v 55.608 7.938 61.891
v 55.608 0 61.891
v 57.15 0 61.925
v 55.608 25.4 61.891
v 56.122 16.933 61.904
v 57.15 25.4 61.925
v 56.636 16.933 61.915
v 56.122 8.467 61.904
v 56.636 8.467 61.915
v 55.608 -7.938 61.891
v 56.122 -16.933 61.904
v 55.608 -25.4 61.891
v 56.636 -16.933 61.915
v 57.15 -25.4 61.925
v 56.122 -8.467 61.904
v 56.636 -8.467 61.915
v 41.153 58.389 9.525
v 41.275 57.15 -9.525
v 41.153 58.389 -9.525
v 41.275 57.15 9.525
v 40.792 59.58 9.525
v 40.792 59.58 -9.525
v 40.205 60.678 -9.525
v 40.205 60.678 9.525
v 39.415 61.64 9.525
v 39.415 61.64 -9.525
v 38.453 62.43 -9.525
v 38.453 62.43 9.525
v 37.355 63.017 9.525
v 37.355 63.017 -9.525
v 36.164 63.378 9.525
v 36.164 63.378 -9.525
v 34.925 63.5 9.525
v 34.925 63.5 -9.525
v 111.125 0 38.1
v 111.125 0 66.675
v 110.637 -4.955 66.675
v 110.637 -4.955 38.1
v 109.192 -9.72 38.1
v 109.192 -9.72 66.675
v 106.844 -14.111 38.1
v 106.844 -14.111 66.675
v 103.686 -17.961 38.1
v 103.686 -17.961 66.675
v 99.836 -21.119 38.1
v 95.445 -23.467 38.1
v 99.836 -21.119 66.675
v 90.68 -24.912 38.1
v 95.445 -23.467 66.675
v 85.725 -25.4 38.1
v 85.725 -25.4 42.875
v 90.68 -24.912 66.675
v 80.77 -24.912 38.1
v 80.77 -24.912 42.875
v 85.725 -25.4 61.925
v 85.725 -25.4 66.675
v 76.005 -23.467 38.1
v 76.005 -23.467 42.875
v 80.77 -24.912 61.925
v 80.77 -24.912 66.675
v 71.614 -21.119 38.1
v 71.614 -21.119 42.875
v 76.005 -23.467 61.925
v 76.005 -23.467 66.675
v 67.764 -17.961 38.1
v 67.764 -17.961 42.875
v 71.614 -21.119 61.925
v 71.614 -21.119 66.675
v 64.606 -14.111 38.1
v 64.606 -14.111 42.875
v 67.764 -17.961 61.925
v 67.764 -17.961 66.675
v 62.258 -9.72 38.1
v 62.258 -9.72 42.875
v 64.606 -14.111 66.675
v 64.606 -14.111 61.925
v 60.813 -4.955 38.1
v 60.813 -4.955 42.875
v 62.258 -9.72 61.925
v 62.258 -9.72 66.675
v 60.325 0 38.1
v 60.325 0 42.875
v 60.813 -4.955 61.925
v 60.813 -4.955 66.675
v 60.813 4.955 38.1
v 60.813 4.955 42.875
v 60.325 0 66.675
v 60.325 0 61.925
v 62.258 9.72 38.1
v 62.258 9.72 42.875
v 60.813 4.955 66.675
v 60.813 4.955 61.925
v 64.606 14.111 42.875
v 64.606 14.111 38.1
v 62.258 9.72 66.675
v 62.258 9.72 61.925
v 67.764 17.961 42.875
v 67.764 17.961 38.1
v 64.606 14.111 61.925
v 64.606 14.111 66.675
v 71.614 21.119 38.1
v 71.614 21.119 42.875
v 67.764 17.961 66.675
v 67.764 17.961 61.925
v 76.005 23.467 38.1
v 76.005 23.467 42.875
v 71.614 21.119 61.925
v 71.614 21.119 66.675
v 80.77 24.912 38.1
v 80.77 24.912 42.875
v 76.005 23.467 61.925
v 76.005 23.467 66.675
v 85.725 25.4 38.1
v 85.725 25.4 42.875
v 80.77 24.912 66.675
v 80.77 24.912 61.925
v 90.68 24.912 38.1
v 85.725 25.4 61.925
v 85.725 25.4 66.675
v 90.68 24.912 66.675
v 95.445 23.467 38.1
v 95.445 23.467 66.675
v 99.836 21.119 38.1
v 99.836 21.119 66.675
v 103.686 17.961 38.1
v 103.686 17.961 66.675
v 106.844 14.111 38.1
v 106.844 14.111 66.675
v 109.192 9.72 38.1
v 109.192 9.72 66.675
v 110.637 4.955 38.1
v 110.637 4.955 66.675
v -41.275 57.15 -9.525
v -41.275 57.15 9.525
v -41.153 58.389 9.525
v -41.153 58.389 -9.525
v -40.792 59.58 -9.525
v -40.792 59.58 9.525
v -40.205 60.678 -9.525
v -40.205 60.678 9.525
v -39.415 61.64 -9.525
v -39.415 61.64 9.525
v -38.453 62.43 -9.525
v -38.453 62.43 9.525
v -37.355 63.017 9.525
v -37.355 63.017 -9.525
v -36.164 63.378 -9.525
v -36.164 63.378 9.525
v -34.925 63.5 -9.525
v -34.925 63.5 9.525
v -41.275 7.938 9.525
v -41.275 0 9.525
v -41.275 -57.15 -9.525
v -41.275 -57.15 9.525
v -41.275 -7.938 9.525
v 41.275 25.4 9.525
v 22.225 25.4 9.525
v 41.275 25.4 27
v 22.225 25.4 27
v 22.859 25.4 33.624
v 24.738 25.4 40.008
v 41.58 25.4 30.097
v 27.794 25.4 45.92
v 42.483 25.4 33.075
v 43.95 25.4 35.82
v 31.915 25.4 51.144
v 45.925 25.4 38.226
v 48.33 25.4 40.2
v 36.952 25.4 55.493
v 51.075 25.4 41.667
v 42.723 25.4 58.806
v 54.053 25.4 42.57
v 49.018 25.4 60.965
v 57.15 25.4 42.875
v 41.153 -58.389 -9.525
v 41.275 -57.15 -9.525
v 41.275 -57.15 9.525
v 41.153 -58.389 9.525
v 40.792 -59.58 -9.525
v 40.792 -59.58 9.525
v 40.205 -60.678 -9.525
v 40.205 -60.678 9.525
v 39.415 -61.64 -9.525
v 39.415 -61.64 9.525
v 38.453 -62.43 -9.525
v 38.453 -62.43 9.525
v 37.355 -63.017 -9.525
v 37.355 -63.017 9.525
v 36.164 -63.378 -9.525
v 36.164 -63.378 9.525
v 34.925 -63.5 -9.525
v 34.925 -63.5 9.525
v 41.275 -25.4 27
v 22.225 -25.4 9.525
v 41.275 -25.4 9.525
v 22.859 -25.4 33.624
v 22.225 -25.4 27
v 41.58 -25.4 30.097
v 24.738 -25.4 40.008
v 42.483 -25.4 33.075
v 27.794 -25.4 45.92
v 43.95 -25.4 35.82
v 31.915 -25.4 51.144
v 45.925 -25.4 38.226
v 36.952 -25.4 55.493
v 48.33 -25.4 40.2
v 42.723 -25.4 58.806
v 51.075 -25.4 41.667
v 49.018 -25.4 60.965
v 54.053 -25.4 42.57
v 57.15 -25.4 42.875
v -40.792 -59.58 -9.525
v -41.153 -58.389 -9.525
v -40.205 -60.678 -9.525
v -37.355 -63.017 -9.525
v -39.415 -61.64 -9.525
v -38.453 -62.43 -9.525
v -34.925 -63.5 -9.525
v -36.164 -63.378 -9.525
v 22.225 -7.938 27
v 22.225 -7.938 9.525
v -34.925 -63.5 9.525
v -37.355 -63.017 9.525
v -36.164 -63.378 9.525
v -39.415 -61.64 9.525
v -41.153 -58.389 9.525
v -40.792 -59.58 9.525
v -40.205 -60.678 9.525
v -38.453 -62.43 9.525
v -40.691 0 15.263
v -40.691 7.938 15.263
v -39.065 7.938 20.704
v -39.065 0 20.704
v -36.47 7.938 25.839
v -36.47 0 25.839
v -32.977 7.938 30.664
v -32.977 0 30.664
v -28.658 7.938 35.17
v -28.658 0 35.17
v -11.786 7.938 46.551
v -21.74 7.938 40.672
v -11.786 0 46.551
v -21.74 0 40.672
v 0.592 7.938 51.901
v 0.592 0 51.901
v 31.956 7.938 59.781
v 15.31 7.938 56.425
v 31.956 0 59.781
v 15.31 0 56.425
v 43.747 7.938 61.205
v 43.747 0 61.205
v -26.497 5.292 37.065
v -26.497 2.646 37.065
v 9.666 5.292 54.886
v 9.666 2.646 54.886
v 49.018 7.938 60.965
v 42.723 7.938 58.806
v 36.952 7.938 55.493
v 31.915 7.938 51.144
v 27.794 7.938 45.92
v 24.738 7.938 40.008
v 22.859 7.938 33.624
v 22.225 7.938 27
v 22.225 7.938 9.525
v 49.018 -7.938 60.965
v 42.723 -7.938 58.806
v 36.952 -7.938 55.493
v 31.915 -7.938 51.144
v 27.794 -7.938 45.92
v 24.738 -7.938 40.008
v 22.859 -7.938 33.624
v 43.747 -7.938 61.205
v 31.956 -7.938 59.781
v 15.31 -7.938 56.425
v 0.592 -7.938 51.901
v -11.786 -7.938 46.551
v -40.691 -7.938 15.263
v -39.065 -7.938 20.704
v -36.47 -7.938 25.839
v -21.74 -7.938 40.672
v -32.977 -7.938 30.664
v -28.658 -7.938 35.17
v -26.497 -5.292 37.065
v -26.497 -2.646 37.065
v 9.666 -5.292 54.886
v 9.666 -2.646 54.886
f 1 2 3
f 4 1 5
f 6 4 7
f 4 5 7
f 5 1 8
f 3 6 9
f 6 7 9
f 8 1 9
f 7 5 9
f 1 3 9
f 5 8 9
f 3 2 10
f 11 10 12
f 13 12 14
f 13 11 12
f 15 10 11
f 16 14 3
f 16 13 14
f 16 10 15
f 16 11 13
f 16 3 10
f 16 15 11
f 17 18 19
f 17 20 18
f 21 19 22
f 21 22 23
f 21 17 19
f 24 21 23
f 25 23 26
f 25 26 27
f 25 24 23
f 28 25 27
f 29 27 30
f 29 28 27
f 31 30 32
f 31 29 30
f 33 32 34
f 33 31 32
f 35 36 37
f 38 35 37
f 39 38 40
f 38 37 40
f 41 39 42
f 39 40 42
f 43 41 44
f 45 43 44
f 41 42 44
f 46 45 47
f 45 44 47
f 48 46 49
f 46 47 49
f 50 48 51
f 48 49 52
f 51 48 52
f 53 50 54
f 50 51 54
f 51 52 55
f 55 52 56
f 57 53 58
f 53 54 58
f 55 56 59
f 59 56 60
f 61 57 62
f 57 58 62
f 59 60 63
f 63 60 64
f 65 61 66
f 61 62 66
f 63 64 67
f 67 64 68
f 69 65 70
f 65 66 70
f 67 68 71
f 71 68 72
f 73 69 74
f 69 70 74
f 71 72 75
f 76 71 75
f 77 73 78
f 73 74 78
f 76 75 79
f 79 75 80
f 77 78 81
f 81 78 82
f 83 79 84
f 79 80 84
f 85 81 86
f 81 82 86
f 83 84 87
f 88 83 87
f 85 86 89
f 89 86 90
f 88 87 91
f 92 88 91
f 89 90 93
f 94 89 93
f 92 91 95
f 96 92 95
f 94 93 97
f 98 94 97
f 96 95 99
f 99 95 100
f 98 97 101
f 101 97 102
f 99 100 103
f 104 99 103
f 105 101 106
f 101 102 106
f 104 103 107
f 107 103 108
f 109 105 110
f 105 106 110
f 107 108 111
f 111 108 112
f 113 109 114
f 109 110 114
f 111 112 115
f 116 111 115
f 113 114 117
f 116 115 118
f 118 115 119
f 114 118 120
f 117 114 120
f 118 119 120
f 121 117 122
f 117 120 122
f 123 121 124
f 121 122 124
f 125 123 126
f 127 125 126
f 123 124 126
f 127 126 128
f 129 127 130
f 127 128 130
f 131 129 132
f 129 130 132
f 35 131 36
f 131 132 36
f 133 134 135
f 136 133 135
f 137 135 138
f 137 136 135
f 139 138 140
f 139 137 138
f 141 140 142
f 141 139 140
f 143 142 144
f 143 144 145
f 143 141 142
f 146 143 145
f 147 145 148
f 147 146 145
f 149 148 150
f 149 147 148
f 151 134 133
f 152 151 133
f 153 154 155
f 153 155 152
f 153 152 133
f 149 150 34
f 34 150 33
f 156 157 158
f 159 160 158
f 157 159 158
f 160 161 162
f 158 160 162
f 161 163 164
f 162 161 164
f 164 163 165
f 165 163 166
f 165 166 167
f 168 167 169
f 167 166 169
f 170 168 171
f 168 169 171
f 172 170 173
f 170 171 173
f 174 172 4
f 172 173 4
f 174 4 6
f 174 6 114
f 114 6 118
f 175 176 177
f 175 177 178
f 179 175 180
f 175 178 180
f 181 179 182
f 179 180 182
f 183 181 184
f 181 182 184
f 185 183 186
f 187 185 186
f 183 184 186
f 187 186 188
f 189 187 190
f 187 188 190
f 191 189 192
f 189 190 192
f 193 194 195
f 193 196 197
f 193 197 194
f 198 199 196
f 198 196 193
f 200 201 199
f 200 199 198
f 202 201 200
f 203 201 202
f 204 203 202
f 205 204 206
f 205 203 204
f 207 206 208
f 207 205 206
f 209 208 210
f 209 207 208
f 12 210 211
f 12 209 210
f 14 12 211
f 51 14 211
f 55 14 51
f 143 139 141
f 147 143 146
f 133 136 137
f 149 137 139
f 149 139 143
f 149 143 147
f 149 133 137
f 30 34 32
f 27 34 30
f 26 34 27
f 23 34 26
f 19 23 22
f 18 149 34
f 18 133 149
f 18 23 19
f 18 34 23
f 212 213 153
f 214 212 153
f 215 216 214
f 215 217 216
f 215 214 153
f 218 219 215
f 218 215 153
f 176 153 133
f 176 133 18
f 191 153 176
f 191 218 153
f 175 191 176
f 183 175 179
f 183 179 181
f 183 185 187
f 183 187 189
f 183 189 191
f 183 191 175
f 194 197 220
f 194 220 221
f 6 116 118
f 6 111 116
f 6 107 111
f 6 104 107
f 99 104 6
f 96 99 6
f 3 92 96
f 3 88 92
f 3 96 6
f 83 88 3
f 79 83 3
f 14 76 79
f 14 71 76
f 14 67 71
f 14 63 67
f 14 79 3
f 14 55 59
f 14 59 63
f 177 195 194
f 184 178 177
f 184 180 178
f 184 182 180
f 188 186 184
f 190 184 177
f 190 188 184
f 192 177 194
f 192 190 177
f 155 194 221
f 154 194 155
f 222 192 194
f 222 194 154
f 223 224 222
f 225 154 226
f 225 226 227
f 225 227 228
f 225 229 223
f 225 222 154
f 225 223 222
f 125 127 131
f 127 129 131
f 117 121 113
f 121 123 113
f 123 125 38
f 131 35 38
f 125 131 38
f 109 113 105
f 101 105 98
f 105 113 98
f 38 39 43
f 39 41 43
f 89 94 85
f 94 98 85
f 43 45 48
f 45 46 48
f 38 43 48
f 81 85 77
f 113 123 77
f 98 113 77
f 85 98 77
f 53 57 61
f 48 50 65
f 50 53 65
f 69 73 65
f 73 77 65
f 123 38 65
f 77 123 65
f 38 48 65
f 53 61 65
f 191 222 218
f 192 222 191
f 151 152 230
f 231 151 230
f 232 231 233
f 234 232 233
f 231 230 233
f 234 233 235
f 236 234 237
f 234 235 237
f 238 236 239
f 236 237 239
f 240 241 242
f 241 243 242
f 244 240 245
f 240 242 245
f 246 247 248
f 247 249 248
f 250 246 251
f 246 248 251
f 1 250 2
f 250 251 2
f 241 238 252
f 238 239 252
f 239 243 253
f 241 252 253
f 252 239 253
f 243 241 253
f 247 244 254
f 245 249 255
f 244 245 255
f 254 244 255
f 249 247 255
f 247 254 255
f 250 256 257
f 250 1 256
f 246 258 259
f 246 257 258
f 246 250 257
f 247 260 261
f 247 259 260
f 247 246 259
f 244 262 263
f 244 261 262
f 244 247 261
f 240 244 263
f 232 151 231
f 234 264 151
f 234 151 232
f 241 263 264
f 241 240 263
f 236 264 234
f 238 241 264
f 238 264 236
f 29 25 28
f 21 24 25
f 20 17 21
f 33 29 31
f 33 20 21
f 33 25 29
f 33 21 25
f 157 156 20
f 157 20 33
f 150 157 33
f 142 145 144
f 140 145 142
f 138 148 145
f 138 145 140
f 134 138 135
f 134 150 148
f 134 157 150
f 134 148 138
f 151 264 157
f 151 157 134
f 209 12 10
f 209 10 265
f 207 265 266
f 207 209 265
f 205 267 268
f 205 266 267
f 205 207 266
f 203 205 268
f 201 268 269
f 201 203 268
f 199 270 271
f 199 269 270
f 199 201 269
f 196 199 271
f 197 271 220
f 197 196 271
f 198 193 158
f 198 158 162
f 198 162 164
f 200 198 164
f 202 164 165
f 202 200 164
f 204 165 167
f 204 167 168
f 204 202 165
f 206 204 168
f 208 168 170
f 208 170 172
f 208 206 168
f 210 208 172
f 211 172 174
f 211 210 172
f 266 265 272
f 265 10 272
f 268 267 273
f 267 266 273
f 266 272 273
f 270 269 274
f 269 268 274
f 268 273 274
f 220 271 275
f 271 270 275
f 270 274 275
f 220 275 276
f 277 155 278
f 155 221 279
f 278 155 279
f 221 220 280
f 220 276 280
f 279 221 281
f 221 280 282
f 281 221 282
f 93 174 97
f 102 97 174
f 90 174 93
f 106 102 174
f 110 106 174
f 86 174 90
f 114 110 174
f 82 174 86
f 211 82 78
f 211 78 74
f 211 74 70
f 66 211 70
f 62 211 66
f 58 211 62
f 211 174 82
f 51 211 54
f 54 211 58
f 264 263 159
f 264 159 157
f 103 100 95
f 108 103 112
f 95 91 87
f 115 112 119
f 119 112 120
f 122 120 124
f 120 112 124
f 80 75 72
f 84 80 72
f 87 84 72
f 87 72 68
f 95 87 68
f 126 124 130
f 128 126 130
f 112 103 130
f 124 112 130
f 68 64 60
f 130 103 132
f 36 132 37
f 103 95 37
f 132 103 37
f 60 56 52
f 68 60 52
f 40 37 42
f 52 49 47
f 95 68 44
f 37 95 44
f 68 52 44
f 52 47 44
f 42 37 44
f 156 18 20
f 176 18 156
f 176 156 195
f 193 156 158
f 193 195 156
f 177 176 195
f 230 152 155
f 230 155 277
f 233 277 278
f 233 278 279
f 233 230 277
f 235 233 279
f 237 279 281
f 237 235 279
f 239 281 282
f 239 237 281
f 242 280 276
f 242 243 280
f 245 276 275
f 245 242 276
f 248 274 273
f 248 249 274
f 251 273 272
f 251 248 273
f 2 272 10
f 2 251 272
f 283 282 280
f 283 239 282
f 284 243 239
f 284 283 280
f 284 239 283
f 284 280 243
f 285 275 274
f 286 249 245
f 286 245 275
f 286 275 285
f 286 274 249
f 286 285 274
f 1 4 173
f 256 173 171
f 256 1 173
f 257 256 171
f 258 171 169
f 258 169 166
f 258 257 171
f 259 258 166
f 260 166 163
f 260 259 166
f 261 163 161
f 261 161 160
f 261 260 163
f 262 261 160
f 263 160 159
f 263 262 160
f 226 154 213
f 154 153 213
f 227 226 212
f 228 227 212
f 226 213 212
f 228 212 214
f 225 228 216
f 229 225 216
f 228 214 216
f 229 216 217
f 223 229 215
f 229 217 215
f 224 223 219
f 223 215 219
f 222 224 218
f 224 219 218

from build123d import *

# Parameters (mm, degrees)
F1_DEPTH = 63.5
F0_W     = 25.4
F0_H     = 19.05
F2_DEPTH = 25.4
F3_DEPTH = 7.9375
F5_R     = 6.35


# Not quite as in the source:
# - a feature names something its author has since deleted; it is built from what else it names


with BuildPart() as f1:
    # F0 (on Front) → F1 (new body, symmetric)
    with BuildSketch(Plane.XZ):
        Polygon((-41.275, 9.525), (-41.275, -9.525), (41.275, -9.525), (41.275, 9.525), (22.225, 9.525), align=None)
    extrude(amount=F1_DEPTH, both=True)

    # F0 (on Front) → F2 (join, symmetric)
    with BuildSketch(Plane.XZ):
        with BuildLine():
            Line((22.225, 9.525), (41.275, 9.525))
            Line((41.275, 9.525), (41.275, 27.0002))
            ThreePointArc((41.275, 27.0002), (45.9246798487, 38.2255201513), (57.15, 42.8752))
            Line((57.15, 42.8752), (60.325, 42.8752))
            Line((60.325, 42.8752), (60.325, 61.9252))
            Line((60.325, 61.9252), (57.15, 61.9252))
            add(Edge.make_bspline(
                [(55.607749268, 61.89113131), (56.1221853633, 61.9046338014), (56.6362918319, 61.9159921928), (57.15, 61.9252)],
                knots=[110.2962801392, 110.2962801392, 110.2962801392, 110.2962801392, 111.5045361635, 111.5045361635, 111.5045361635, 111.5045361635], degree=3))
            ThreePointArc((55.607749268, 61.89113131), (31.9149179532, 51.1444800491), (22.225, 27.0002))
            Line((22.225, 27.0002), (22.225, 9.525))
        make_face()
        with Locations((73.025, 52.4002)):
            Rectangle(F0_W, F0_H)
    extrude(amount=F2_DEPTH, both=True)

    # F0 (on Front) → F3 (join, symmetric)
    with BuildSketch(Plane.XZ):
        with BuildLine():
            add(Edge.make_bspline(
                [(-41.275, 9.525), (-41.060178382, 41.5590820395), (8.6471825165, 60.6585493514), (55.607749268, 61.89113131)],
                knots=[0, 0, 0, 0, 110.2962801392, 110.2962801392, 110.2962801392, 110.2962801392], degree=3))
            Line((-41.275, 9.525), (22.225, 9.525))
            Line((22.225, 9.525), (22.225, 27.0002))
            ThreePointArc((22.225, 27.0002), (31.9149179532, 51.1444800491), (55.607749268, 61.89113131))
        make_face()
    extrude(amount=F3_DEPTH, both=True)

    # F0 (on Front) → F4 (revolve)
    with BuildSketch(Plane.XZ):
        Polygon((85.725, 66.675), (85.725, 61.9252), (85.725, 42.8752), (85.725, 38.1), (111.125, 38.1), (111.125, 66.675), align=None)
    revolve(axis=Axis((85.725, 0, 52.3875), (0, 0, -1)))

    # F5
    f5_edges = [f1.edges().sort_by_distance(p)[0] for p in [
        (41.275, -63.5, 0),
        (41.275, 63.5, 0),
        (-41.275, -63.5, 0),
        (-41.275, 63.5, 0),
    ]]
    fillet(f5_edges, radius=F5_R)


solid = f1.part
